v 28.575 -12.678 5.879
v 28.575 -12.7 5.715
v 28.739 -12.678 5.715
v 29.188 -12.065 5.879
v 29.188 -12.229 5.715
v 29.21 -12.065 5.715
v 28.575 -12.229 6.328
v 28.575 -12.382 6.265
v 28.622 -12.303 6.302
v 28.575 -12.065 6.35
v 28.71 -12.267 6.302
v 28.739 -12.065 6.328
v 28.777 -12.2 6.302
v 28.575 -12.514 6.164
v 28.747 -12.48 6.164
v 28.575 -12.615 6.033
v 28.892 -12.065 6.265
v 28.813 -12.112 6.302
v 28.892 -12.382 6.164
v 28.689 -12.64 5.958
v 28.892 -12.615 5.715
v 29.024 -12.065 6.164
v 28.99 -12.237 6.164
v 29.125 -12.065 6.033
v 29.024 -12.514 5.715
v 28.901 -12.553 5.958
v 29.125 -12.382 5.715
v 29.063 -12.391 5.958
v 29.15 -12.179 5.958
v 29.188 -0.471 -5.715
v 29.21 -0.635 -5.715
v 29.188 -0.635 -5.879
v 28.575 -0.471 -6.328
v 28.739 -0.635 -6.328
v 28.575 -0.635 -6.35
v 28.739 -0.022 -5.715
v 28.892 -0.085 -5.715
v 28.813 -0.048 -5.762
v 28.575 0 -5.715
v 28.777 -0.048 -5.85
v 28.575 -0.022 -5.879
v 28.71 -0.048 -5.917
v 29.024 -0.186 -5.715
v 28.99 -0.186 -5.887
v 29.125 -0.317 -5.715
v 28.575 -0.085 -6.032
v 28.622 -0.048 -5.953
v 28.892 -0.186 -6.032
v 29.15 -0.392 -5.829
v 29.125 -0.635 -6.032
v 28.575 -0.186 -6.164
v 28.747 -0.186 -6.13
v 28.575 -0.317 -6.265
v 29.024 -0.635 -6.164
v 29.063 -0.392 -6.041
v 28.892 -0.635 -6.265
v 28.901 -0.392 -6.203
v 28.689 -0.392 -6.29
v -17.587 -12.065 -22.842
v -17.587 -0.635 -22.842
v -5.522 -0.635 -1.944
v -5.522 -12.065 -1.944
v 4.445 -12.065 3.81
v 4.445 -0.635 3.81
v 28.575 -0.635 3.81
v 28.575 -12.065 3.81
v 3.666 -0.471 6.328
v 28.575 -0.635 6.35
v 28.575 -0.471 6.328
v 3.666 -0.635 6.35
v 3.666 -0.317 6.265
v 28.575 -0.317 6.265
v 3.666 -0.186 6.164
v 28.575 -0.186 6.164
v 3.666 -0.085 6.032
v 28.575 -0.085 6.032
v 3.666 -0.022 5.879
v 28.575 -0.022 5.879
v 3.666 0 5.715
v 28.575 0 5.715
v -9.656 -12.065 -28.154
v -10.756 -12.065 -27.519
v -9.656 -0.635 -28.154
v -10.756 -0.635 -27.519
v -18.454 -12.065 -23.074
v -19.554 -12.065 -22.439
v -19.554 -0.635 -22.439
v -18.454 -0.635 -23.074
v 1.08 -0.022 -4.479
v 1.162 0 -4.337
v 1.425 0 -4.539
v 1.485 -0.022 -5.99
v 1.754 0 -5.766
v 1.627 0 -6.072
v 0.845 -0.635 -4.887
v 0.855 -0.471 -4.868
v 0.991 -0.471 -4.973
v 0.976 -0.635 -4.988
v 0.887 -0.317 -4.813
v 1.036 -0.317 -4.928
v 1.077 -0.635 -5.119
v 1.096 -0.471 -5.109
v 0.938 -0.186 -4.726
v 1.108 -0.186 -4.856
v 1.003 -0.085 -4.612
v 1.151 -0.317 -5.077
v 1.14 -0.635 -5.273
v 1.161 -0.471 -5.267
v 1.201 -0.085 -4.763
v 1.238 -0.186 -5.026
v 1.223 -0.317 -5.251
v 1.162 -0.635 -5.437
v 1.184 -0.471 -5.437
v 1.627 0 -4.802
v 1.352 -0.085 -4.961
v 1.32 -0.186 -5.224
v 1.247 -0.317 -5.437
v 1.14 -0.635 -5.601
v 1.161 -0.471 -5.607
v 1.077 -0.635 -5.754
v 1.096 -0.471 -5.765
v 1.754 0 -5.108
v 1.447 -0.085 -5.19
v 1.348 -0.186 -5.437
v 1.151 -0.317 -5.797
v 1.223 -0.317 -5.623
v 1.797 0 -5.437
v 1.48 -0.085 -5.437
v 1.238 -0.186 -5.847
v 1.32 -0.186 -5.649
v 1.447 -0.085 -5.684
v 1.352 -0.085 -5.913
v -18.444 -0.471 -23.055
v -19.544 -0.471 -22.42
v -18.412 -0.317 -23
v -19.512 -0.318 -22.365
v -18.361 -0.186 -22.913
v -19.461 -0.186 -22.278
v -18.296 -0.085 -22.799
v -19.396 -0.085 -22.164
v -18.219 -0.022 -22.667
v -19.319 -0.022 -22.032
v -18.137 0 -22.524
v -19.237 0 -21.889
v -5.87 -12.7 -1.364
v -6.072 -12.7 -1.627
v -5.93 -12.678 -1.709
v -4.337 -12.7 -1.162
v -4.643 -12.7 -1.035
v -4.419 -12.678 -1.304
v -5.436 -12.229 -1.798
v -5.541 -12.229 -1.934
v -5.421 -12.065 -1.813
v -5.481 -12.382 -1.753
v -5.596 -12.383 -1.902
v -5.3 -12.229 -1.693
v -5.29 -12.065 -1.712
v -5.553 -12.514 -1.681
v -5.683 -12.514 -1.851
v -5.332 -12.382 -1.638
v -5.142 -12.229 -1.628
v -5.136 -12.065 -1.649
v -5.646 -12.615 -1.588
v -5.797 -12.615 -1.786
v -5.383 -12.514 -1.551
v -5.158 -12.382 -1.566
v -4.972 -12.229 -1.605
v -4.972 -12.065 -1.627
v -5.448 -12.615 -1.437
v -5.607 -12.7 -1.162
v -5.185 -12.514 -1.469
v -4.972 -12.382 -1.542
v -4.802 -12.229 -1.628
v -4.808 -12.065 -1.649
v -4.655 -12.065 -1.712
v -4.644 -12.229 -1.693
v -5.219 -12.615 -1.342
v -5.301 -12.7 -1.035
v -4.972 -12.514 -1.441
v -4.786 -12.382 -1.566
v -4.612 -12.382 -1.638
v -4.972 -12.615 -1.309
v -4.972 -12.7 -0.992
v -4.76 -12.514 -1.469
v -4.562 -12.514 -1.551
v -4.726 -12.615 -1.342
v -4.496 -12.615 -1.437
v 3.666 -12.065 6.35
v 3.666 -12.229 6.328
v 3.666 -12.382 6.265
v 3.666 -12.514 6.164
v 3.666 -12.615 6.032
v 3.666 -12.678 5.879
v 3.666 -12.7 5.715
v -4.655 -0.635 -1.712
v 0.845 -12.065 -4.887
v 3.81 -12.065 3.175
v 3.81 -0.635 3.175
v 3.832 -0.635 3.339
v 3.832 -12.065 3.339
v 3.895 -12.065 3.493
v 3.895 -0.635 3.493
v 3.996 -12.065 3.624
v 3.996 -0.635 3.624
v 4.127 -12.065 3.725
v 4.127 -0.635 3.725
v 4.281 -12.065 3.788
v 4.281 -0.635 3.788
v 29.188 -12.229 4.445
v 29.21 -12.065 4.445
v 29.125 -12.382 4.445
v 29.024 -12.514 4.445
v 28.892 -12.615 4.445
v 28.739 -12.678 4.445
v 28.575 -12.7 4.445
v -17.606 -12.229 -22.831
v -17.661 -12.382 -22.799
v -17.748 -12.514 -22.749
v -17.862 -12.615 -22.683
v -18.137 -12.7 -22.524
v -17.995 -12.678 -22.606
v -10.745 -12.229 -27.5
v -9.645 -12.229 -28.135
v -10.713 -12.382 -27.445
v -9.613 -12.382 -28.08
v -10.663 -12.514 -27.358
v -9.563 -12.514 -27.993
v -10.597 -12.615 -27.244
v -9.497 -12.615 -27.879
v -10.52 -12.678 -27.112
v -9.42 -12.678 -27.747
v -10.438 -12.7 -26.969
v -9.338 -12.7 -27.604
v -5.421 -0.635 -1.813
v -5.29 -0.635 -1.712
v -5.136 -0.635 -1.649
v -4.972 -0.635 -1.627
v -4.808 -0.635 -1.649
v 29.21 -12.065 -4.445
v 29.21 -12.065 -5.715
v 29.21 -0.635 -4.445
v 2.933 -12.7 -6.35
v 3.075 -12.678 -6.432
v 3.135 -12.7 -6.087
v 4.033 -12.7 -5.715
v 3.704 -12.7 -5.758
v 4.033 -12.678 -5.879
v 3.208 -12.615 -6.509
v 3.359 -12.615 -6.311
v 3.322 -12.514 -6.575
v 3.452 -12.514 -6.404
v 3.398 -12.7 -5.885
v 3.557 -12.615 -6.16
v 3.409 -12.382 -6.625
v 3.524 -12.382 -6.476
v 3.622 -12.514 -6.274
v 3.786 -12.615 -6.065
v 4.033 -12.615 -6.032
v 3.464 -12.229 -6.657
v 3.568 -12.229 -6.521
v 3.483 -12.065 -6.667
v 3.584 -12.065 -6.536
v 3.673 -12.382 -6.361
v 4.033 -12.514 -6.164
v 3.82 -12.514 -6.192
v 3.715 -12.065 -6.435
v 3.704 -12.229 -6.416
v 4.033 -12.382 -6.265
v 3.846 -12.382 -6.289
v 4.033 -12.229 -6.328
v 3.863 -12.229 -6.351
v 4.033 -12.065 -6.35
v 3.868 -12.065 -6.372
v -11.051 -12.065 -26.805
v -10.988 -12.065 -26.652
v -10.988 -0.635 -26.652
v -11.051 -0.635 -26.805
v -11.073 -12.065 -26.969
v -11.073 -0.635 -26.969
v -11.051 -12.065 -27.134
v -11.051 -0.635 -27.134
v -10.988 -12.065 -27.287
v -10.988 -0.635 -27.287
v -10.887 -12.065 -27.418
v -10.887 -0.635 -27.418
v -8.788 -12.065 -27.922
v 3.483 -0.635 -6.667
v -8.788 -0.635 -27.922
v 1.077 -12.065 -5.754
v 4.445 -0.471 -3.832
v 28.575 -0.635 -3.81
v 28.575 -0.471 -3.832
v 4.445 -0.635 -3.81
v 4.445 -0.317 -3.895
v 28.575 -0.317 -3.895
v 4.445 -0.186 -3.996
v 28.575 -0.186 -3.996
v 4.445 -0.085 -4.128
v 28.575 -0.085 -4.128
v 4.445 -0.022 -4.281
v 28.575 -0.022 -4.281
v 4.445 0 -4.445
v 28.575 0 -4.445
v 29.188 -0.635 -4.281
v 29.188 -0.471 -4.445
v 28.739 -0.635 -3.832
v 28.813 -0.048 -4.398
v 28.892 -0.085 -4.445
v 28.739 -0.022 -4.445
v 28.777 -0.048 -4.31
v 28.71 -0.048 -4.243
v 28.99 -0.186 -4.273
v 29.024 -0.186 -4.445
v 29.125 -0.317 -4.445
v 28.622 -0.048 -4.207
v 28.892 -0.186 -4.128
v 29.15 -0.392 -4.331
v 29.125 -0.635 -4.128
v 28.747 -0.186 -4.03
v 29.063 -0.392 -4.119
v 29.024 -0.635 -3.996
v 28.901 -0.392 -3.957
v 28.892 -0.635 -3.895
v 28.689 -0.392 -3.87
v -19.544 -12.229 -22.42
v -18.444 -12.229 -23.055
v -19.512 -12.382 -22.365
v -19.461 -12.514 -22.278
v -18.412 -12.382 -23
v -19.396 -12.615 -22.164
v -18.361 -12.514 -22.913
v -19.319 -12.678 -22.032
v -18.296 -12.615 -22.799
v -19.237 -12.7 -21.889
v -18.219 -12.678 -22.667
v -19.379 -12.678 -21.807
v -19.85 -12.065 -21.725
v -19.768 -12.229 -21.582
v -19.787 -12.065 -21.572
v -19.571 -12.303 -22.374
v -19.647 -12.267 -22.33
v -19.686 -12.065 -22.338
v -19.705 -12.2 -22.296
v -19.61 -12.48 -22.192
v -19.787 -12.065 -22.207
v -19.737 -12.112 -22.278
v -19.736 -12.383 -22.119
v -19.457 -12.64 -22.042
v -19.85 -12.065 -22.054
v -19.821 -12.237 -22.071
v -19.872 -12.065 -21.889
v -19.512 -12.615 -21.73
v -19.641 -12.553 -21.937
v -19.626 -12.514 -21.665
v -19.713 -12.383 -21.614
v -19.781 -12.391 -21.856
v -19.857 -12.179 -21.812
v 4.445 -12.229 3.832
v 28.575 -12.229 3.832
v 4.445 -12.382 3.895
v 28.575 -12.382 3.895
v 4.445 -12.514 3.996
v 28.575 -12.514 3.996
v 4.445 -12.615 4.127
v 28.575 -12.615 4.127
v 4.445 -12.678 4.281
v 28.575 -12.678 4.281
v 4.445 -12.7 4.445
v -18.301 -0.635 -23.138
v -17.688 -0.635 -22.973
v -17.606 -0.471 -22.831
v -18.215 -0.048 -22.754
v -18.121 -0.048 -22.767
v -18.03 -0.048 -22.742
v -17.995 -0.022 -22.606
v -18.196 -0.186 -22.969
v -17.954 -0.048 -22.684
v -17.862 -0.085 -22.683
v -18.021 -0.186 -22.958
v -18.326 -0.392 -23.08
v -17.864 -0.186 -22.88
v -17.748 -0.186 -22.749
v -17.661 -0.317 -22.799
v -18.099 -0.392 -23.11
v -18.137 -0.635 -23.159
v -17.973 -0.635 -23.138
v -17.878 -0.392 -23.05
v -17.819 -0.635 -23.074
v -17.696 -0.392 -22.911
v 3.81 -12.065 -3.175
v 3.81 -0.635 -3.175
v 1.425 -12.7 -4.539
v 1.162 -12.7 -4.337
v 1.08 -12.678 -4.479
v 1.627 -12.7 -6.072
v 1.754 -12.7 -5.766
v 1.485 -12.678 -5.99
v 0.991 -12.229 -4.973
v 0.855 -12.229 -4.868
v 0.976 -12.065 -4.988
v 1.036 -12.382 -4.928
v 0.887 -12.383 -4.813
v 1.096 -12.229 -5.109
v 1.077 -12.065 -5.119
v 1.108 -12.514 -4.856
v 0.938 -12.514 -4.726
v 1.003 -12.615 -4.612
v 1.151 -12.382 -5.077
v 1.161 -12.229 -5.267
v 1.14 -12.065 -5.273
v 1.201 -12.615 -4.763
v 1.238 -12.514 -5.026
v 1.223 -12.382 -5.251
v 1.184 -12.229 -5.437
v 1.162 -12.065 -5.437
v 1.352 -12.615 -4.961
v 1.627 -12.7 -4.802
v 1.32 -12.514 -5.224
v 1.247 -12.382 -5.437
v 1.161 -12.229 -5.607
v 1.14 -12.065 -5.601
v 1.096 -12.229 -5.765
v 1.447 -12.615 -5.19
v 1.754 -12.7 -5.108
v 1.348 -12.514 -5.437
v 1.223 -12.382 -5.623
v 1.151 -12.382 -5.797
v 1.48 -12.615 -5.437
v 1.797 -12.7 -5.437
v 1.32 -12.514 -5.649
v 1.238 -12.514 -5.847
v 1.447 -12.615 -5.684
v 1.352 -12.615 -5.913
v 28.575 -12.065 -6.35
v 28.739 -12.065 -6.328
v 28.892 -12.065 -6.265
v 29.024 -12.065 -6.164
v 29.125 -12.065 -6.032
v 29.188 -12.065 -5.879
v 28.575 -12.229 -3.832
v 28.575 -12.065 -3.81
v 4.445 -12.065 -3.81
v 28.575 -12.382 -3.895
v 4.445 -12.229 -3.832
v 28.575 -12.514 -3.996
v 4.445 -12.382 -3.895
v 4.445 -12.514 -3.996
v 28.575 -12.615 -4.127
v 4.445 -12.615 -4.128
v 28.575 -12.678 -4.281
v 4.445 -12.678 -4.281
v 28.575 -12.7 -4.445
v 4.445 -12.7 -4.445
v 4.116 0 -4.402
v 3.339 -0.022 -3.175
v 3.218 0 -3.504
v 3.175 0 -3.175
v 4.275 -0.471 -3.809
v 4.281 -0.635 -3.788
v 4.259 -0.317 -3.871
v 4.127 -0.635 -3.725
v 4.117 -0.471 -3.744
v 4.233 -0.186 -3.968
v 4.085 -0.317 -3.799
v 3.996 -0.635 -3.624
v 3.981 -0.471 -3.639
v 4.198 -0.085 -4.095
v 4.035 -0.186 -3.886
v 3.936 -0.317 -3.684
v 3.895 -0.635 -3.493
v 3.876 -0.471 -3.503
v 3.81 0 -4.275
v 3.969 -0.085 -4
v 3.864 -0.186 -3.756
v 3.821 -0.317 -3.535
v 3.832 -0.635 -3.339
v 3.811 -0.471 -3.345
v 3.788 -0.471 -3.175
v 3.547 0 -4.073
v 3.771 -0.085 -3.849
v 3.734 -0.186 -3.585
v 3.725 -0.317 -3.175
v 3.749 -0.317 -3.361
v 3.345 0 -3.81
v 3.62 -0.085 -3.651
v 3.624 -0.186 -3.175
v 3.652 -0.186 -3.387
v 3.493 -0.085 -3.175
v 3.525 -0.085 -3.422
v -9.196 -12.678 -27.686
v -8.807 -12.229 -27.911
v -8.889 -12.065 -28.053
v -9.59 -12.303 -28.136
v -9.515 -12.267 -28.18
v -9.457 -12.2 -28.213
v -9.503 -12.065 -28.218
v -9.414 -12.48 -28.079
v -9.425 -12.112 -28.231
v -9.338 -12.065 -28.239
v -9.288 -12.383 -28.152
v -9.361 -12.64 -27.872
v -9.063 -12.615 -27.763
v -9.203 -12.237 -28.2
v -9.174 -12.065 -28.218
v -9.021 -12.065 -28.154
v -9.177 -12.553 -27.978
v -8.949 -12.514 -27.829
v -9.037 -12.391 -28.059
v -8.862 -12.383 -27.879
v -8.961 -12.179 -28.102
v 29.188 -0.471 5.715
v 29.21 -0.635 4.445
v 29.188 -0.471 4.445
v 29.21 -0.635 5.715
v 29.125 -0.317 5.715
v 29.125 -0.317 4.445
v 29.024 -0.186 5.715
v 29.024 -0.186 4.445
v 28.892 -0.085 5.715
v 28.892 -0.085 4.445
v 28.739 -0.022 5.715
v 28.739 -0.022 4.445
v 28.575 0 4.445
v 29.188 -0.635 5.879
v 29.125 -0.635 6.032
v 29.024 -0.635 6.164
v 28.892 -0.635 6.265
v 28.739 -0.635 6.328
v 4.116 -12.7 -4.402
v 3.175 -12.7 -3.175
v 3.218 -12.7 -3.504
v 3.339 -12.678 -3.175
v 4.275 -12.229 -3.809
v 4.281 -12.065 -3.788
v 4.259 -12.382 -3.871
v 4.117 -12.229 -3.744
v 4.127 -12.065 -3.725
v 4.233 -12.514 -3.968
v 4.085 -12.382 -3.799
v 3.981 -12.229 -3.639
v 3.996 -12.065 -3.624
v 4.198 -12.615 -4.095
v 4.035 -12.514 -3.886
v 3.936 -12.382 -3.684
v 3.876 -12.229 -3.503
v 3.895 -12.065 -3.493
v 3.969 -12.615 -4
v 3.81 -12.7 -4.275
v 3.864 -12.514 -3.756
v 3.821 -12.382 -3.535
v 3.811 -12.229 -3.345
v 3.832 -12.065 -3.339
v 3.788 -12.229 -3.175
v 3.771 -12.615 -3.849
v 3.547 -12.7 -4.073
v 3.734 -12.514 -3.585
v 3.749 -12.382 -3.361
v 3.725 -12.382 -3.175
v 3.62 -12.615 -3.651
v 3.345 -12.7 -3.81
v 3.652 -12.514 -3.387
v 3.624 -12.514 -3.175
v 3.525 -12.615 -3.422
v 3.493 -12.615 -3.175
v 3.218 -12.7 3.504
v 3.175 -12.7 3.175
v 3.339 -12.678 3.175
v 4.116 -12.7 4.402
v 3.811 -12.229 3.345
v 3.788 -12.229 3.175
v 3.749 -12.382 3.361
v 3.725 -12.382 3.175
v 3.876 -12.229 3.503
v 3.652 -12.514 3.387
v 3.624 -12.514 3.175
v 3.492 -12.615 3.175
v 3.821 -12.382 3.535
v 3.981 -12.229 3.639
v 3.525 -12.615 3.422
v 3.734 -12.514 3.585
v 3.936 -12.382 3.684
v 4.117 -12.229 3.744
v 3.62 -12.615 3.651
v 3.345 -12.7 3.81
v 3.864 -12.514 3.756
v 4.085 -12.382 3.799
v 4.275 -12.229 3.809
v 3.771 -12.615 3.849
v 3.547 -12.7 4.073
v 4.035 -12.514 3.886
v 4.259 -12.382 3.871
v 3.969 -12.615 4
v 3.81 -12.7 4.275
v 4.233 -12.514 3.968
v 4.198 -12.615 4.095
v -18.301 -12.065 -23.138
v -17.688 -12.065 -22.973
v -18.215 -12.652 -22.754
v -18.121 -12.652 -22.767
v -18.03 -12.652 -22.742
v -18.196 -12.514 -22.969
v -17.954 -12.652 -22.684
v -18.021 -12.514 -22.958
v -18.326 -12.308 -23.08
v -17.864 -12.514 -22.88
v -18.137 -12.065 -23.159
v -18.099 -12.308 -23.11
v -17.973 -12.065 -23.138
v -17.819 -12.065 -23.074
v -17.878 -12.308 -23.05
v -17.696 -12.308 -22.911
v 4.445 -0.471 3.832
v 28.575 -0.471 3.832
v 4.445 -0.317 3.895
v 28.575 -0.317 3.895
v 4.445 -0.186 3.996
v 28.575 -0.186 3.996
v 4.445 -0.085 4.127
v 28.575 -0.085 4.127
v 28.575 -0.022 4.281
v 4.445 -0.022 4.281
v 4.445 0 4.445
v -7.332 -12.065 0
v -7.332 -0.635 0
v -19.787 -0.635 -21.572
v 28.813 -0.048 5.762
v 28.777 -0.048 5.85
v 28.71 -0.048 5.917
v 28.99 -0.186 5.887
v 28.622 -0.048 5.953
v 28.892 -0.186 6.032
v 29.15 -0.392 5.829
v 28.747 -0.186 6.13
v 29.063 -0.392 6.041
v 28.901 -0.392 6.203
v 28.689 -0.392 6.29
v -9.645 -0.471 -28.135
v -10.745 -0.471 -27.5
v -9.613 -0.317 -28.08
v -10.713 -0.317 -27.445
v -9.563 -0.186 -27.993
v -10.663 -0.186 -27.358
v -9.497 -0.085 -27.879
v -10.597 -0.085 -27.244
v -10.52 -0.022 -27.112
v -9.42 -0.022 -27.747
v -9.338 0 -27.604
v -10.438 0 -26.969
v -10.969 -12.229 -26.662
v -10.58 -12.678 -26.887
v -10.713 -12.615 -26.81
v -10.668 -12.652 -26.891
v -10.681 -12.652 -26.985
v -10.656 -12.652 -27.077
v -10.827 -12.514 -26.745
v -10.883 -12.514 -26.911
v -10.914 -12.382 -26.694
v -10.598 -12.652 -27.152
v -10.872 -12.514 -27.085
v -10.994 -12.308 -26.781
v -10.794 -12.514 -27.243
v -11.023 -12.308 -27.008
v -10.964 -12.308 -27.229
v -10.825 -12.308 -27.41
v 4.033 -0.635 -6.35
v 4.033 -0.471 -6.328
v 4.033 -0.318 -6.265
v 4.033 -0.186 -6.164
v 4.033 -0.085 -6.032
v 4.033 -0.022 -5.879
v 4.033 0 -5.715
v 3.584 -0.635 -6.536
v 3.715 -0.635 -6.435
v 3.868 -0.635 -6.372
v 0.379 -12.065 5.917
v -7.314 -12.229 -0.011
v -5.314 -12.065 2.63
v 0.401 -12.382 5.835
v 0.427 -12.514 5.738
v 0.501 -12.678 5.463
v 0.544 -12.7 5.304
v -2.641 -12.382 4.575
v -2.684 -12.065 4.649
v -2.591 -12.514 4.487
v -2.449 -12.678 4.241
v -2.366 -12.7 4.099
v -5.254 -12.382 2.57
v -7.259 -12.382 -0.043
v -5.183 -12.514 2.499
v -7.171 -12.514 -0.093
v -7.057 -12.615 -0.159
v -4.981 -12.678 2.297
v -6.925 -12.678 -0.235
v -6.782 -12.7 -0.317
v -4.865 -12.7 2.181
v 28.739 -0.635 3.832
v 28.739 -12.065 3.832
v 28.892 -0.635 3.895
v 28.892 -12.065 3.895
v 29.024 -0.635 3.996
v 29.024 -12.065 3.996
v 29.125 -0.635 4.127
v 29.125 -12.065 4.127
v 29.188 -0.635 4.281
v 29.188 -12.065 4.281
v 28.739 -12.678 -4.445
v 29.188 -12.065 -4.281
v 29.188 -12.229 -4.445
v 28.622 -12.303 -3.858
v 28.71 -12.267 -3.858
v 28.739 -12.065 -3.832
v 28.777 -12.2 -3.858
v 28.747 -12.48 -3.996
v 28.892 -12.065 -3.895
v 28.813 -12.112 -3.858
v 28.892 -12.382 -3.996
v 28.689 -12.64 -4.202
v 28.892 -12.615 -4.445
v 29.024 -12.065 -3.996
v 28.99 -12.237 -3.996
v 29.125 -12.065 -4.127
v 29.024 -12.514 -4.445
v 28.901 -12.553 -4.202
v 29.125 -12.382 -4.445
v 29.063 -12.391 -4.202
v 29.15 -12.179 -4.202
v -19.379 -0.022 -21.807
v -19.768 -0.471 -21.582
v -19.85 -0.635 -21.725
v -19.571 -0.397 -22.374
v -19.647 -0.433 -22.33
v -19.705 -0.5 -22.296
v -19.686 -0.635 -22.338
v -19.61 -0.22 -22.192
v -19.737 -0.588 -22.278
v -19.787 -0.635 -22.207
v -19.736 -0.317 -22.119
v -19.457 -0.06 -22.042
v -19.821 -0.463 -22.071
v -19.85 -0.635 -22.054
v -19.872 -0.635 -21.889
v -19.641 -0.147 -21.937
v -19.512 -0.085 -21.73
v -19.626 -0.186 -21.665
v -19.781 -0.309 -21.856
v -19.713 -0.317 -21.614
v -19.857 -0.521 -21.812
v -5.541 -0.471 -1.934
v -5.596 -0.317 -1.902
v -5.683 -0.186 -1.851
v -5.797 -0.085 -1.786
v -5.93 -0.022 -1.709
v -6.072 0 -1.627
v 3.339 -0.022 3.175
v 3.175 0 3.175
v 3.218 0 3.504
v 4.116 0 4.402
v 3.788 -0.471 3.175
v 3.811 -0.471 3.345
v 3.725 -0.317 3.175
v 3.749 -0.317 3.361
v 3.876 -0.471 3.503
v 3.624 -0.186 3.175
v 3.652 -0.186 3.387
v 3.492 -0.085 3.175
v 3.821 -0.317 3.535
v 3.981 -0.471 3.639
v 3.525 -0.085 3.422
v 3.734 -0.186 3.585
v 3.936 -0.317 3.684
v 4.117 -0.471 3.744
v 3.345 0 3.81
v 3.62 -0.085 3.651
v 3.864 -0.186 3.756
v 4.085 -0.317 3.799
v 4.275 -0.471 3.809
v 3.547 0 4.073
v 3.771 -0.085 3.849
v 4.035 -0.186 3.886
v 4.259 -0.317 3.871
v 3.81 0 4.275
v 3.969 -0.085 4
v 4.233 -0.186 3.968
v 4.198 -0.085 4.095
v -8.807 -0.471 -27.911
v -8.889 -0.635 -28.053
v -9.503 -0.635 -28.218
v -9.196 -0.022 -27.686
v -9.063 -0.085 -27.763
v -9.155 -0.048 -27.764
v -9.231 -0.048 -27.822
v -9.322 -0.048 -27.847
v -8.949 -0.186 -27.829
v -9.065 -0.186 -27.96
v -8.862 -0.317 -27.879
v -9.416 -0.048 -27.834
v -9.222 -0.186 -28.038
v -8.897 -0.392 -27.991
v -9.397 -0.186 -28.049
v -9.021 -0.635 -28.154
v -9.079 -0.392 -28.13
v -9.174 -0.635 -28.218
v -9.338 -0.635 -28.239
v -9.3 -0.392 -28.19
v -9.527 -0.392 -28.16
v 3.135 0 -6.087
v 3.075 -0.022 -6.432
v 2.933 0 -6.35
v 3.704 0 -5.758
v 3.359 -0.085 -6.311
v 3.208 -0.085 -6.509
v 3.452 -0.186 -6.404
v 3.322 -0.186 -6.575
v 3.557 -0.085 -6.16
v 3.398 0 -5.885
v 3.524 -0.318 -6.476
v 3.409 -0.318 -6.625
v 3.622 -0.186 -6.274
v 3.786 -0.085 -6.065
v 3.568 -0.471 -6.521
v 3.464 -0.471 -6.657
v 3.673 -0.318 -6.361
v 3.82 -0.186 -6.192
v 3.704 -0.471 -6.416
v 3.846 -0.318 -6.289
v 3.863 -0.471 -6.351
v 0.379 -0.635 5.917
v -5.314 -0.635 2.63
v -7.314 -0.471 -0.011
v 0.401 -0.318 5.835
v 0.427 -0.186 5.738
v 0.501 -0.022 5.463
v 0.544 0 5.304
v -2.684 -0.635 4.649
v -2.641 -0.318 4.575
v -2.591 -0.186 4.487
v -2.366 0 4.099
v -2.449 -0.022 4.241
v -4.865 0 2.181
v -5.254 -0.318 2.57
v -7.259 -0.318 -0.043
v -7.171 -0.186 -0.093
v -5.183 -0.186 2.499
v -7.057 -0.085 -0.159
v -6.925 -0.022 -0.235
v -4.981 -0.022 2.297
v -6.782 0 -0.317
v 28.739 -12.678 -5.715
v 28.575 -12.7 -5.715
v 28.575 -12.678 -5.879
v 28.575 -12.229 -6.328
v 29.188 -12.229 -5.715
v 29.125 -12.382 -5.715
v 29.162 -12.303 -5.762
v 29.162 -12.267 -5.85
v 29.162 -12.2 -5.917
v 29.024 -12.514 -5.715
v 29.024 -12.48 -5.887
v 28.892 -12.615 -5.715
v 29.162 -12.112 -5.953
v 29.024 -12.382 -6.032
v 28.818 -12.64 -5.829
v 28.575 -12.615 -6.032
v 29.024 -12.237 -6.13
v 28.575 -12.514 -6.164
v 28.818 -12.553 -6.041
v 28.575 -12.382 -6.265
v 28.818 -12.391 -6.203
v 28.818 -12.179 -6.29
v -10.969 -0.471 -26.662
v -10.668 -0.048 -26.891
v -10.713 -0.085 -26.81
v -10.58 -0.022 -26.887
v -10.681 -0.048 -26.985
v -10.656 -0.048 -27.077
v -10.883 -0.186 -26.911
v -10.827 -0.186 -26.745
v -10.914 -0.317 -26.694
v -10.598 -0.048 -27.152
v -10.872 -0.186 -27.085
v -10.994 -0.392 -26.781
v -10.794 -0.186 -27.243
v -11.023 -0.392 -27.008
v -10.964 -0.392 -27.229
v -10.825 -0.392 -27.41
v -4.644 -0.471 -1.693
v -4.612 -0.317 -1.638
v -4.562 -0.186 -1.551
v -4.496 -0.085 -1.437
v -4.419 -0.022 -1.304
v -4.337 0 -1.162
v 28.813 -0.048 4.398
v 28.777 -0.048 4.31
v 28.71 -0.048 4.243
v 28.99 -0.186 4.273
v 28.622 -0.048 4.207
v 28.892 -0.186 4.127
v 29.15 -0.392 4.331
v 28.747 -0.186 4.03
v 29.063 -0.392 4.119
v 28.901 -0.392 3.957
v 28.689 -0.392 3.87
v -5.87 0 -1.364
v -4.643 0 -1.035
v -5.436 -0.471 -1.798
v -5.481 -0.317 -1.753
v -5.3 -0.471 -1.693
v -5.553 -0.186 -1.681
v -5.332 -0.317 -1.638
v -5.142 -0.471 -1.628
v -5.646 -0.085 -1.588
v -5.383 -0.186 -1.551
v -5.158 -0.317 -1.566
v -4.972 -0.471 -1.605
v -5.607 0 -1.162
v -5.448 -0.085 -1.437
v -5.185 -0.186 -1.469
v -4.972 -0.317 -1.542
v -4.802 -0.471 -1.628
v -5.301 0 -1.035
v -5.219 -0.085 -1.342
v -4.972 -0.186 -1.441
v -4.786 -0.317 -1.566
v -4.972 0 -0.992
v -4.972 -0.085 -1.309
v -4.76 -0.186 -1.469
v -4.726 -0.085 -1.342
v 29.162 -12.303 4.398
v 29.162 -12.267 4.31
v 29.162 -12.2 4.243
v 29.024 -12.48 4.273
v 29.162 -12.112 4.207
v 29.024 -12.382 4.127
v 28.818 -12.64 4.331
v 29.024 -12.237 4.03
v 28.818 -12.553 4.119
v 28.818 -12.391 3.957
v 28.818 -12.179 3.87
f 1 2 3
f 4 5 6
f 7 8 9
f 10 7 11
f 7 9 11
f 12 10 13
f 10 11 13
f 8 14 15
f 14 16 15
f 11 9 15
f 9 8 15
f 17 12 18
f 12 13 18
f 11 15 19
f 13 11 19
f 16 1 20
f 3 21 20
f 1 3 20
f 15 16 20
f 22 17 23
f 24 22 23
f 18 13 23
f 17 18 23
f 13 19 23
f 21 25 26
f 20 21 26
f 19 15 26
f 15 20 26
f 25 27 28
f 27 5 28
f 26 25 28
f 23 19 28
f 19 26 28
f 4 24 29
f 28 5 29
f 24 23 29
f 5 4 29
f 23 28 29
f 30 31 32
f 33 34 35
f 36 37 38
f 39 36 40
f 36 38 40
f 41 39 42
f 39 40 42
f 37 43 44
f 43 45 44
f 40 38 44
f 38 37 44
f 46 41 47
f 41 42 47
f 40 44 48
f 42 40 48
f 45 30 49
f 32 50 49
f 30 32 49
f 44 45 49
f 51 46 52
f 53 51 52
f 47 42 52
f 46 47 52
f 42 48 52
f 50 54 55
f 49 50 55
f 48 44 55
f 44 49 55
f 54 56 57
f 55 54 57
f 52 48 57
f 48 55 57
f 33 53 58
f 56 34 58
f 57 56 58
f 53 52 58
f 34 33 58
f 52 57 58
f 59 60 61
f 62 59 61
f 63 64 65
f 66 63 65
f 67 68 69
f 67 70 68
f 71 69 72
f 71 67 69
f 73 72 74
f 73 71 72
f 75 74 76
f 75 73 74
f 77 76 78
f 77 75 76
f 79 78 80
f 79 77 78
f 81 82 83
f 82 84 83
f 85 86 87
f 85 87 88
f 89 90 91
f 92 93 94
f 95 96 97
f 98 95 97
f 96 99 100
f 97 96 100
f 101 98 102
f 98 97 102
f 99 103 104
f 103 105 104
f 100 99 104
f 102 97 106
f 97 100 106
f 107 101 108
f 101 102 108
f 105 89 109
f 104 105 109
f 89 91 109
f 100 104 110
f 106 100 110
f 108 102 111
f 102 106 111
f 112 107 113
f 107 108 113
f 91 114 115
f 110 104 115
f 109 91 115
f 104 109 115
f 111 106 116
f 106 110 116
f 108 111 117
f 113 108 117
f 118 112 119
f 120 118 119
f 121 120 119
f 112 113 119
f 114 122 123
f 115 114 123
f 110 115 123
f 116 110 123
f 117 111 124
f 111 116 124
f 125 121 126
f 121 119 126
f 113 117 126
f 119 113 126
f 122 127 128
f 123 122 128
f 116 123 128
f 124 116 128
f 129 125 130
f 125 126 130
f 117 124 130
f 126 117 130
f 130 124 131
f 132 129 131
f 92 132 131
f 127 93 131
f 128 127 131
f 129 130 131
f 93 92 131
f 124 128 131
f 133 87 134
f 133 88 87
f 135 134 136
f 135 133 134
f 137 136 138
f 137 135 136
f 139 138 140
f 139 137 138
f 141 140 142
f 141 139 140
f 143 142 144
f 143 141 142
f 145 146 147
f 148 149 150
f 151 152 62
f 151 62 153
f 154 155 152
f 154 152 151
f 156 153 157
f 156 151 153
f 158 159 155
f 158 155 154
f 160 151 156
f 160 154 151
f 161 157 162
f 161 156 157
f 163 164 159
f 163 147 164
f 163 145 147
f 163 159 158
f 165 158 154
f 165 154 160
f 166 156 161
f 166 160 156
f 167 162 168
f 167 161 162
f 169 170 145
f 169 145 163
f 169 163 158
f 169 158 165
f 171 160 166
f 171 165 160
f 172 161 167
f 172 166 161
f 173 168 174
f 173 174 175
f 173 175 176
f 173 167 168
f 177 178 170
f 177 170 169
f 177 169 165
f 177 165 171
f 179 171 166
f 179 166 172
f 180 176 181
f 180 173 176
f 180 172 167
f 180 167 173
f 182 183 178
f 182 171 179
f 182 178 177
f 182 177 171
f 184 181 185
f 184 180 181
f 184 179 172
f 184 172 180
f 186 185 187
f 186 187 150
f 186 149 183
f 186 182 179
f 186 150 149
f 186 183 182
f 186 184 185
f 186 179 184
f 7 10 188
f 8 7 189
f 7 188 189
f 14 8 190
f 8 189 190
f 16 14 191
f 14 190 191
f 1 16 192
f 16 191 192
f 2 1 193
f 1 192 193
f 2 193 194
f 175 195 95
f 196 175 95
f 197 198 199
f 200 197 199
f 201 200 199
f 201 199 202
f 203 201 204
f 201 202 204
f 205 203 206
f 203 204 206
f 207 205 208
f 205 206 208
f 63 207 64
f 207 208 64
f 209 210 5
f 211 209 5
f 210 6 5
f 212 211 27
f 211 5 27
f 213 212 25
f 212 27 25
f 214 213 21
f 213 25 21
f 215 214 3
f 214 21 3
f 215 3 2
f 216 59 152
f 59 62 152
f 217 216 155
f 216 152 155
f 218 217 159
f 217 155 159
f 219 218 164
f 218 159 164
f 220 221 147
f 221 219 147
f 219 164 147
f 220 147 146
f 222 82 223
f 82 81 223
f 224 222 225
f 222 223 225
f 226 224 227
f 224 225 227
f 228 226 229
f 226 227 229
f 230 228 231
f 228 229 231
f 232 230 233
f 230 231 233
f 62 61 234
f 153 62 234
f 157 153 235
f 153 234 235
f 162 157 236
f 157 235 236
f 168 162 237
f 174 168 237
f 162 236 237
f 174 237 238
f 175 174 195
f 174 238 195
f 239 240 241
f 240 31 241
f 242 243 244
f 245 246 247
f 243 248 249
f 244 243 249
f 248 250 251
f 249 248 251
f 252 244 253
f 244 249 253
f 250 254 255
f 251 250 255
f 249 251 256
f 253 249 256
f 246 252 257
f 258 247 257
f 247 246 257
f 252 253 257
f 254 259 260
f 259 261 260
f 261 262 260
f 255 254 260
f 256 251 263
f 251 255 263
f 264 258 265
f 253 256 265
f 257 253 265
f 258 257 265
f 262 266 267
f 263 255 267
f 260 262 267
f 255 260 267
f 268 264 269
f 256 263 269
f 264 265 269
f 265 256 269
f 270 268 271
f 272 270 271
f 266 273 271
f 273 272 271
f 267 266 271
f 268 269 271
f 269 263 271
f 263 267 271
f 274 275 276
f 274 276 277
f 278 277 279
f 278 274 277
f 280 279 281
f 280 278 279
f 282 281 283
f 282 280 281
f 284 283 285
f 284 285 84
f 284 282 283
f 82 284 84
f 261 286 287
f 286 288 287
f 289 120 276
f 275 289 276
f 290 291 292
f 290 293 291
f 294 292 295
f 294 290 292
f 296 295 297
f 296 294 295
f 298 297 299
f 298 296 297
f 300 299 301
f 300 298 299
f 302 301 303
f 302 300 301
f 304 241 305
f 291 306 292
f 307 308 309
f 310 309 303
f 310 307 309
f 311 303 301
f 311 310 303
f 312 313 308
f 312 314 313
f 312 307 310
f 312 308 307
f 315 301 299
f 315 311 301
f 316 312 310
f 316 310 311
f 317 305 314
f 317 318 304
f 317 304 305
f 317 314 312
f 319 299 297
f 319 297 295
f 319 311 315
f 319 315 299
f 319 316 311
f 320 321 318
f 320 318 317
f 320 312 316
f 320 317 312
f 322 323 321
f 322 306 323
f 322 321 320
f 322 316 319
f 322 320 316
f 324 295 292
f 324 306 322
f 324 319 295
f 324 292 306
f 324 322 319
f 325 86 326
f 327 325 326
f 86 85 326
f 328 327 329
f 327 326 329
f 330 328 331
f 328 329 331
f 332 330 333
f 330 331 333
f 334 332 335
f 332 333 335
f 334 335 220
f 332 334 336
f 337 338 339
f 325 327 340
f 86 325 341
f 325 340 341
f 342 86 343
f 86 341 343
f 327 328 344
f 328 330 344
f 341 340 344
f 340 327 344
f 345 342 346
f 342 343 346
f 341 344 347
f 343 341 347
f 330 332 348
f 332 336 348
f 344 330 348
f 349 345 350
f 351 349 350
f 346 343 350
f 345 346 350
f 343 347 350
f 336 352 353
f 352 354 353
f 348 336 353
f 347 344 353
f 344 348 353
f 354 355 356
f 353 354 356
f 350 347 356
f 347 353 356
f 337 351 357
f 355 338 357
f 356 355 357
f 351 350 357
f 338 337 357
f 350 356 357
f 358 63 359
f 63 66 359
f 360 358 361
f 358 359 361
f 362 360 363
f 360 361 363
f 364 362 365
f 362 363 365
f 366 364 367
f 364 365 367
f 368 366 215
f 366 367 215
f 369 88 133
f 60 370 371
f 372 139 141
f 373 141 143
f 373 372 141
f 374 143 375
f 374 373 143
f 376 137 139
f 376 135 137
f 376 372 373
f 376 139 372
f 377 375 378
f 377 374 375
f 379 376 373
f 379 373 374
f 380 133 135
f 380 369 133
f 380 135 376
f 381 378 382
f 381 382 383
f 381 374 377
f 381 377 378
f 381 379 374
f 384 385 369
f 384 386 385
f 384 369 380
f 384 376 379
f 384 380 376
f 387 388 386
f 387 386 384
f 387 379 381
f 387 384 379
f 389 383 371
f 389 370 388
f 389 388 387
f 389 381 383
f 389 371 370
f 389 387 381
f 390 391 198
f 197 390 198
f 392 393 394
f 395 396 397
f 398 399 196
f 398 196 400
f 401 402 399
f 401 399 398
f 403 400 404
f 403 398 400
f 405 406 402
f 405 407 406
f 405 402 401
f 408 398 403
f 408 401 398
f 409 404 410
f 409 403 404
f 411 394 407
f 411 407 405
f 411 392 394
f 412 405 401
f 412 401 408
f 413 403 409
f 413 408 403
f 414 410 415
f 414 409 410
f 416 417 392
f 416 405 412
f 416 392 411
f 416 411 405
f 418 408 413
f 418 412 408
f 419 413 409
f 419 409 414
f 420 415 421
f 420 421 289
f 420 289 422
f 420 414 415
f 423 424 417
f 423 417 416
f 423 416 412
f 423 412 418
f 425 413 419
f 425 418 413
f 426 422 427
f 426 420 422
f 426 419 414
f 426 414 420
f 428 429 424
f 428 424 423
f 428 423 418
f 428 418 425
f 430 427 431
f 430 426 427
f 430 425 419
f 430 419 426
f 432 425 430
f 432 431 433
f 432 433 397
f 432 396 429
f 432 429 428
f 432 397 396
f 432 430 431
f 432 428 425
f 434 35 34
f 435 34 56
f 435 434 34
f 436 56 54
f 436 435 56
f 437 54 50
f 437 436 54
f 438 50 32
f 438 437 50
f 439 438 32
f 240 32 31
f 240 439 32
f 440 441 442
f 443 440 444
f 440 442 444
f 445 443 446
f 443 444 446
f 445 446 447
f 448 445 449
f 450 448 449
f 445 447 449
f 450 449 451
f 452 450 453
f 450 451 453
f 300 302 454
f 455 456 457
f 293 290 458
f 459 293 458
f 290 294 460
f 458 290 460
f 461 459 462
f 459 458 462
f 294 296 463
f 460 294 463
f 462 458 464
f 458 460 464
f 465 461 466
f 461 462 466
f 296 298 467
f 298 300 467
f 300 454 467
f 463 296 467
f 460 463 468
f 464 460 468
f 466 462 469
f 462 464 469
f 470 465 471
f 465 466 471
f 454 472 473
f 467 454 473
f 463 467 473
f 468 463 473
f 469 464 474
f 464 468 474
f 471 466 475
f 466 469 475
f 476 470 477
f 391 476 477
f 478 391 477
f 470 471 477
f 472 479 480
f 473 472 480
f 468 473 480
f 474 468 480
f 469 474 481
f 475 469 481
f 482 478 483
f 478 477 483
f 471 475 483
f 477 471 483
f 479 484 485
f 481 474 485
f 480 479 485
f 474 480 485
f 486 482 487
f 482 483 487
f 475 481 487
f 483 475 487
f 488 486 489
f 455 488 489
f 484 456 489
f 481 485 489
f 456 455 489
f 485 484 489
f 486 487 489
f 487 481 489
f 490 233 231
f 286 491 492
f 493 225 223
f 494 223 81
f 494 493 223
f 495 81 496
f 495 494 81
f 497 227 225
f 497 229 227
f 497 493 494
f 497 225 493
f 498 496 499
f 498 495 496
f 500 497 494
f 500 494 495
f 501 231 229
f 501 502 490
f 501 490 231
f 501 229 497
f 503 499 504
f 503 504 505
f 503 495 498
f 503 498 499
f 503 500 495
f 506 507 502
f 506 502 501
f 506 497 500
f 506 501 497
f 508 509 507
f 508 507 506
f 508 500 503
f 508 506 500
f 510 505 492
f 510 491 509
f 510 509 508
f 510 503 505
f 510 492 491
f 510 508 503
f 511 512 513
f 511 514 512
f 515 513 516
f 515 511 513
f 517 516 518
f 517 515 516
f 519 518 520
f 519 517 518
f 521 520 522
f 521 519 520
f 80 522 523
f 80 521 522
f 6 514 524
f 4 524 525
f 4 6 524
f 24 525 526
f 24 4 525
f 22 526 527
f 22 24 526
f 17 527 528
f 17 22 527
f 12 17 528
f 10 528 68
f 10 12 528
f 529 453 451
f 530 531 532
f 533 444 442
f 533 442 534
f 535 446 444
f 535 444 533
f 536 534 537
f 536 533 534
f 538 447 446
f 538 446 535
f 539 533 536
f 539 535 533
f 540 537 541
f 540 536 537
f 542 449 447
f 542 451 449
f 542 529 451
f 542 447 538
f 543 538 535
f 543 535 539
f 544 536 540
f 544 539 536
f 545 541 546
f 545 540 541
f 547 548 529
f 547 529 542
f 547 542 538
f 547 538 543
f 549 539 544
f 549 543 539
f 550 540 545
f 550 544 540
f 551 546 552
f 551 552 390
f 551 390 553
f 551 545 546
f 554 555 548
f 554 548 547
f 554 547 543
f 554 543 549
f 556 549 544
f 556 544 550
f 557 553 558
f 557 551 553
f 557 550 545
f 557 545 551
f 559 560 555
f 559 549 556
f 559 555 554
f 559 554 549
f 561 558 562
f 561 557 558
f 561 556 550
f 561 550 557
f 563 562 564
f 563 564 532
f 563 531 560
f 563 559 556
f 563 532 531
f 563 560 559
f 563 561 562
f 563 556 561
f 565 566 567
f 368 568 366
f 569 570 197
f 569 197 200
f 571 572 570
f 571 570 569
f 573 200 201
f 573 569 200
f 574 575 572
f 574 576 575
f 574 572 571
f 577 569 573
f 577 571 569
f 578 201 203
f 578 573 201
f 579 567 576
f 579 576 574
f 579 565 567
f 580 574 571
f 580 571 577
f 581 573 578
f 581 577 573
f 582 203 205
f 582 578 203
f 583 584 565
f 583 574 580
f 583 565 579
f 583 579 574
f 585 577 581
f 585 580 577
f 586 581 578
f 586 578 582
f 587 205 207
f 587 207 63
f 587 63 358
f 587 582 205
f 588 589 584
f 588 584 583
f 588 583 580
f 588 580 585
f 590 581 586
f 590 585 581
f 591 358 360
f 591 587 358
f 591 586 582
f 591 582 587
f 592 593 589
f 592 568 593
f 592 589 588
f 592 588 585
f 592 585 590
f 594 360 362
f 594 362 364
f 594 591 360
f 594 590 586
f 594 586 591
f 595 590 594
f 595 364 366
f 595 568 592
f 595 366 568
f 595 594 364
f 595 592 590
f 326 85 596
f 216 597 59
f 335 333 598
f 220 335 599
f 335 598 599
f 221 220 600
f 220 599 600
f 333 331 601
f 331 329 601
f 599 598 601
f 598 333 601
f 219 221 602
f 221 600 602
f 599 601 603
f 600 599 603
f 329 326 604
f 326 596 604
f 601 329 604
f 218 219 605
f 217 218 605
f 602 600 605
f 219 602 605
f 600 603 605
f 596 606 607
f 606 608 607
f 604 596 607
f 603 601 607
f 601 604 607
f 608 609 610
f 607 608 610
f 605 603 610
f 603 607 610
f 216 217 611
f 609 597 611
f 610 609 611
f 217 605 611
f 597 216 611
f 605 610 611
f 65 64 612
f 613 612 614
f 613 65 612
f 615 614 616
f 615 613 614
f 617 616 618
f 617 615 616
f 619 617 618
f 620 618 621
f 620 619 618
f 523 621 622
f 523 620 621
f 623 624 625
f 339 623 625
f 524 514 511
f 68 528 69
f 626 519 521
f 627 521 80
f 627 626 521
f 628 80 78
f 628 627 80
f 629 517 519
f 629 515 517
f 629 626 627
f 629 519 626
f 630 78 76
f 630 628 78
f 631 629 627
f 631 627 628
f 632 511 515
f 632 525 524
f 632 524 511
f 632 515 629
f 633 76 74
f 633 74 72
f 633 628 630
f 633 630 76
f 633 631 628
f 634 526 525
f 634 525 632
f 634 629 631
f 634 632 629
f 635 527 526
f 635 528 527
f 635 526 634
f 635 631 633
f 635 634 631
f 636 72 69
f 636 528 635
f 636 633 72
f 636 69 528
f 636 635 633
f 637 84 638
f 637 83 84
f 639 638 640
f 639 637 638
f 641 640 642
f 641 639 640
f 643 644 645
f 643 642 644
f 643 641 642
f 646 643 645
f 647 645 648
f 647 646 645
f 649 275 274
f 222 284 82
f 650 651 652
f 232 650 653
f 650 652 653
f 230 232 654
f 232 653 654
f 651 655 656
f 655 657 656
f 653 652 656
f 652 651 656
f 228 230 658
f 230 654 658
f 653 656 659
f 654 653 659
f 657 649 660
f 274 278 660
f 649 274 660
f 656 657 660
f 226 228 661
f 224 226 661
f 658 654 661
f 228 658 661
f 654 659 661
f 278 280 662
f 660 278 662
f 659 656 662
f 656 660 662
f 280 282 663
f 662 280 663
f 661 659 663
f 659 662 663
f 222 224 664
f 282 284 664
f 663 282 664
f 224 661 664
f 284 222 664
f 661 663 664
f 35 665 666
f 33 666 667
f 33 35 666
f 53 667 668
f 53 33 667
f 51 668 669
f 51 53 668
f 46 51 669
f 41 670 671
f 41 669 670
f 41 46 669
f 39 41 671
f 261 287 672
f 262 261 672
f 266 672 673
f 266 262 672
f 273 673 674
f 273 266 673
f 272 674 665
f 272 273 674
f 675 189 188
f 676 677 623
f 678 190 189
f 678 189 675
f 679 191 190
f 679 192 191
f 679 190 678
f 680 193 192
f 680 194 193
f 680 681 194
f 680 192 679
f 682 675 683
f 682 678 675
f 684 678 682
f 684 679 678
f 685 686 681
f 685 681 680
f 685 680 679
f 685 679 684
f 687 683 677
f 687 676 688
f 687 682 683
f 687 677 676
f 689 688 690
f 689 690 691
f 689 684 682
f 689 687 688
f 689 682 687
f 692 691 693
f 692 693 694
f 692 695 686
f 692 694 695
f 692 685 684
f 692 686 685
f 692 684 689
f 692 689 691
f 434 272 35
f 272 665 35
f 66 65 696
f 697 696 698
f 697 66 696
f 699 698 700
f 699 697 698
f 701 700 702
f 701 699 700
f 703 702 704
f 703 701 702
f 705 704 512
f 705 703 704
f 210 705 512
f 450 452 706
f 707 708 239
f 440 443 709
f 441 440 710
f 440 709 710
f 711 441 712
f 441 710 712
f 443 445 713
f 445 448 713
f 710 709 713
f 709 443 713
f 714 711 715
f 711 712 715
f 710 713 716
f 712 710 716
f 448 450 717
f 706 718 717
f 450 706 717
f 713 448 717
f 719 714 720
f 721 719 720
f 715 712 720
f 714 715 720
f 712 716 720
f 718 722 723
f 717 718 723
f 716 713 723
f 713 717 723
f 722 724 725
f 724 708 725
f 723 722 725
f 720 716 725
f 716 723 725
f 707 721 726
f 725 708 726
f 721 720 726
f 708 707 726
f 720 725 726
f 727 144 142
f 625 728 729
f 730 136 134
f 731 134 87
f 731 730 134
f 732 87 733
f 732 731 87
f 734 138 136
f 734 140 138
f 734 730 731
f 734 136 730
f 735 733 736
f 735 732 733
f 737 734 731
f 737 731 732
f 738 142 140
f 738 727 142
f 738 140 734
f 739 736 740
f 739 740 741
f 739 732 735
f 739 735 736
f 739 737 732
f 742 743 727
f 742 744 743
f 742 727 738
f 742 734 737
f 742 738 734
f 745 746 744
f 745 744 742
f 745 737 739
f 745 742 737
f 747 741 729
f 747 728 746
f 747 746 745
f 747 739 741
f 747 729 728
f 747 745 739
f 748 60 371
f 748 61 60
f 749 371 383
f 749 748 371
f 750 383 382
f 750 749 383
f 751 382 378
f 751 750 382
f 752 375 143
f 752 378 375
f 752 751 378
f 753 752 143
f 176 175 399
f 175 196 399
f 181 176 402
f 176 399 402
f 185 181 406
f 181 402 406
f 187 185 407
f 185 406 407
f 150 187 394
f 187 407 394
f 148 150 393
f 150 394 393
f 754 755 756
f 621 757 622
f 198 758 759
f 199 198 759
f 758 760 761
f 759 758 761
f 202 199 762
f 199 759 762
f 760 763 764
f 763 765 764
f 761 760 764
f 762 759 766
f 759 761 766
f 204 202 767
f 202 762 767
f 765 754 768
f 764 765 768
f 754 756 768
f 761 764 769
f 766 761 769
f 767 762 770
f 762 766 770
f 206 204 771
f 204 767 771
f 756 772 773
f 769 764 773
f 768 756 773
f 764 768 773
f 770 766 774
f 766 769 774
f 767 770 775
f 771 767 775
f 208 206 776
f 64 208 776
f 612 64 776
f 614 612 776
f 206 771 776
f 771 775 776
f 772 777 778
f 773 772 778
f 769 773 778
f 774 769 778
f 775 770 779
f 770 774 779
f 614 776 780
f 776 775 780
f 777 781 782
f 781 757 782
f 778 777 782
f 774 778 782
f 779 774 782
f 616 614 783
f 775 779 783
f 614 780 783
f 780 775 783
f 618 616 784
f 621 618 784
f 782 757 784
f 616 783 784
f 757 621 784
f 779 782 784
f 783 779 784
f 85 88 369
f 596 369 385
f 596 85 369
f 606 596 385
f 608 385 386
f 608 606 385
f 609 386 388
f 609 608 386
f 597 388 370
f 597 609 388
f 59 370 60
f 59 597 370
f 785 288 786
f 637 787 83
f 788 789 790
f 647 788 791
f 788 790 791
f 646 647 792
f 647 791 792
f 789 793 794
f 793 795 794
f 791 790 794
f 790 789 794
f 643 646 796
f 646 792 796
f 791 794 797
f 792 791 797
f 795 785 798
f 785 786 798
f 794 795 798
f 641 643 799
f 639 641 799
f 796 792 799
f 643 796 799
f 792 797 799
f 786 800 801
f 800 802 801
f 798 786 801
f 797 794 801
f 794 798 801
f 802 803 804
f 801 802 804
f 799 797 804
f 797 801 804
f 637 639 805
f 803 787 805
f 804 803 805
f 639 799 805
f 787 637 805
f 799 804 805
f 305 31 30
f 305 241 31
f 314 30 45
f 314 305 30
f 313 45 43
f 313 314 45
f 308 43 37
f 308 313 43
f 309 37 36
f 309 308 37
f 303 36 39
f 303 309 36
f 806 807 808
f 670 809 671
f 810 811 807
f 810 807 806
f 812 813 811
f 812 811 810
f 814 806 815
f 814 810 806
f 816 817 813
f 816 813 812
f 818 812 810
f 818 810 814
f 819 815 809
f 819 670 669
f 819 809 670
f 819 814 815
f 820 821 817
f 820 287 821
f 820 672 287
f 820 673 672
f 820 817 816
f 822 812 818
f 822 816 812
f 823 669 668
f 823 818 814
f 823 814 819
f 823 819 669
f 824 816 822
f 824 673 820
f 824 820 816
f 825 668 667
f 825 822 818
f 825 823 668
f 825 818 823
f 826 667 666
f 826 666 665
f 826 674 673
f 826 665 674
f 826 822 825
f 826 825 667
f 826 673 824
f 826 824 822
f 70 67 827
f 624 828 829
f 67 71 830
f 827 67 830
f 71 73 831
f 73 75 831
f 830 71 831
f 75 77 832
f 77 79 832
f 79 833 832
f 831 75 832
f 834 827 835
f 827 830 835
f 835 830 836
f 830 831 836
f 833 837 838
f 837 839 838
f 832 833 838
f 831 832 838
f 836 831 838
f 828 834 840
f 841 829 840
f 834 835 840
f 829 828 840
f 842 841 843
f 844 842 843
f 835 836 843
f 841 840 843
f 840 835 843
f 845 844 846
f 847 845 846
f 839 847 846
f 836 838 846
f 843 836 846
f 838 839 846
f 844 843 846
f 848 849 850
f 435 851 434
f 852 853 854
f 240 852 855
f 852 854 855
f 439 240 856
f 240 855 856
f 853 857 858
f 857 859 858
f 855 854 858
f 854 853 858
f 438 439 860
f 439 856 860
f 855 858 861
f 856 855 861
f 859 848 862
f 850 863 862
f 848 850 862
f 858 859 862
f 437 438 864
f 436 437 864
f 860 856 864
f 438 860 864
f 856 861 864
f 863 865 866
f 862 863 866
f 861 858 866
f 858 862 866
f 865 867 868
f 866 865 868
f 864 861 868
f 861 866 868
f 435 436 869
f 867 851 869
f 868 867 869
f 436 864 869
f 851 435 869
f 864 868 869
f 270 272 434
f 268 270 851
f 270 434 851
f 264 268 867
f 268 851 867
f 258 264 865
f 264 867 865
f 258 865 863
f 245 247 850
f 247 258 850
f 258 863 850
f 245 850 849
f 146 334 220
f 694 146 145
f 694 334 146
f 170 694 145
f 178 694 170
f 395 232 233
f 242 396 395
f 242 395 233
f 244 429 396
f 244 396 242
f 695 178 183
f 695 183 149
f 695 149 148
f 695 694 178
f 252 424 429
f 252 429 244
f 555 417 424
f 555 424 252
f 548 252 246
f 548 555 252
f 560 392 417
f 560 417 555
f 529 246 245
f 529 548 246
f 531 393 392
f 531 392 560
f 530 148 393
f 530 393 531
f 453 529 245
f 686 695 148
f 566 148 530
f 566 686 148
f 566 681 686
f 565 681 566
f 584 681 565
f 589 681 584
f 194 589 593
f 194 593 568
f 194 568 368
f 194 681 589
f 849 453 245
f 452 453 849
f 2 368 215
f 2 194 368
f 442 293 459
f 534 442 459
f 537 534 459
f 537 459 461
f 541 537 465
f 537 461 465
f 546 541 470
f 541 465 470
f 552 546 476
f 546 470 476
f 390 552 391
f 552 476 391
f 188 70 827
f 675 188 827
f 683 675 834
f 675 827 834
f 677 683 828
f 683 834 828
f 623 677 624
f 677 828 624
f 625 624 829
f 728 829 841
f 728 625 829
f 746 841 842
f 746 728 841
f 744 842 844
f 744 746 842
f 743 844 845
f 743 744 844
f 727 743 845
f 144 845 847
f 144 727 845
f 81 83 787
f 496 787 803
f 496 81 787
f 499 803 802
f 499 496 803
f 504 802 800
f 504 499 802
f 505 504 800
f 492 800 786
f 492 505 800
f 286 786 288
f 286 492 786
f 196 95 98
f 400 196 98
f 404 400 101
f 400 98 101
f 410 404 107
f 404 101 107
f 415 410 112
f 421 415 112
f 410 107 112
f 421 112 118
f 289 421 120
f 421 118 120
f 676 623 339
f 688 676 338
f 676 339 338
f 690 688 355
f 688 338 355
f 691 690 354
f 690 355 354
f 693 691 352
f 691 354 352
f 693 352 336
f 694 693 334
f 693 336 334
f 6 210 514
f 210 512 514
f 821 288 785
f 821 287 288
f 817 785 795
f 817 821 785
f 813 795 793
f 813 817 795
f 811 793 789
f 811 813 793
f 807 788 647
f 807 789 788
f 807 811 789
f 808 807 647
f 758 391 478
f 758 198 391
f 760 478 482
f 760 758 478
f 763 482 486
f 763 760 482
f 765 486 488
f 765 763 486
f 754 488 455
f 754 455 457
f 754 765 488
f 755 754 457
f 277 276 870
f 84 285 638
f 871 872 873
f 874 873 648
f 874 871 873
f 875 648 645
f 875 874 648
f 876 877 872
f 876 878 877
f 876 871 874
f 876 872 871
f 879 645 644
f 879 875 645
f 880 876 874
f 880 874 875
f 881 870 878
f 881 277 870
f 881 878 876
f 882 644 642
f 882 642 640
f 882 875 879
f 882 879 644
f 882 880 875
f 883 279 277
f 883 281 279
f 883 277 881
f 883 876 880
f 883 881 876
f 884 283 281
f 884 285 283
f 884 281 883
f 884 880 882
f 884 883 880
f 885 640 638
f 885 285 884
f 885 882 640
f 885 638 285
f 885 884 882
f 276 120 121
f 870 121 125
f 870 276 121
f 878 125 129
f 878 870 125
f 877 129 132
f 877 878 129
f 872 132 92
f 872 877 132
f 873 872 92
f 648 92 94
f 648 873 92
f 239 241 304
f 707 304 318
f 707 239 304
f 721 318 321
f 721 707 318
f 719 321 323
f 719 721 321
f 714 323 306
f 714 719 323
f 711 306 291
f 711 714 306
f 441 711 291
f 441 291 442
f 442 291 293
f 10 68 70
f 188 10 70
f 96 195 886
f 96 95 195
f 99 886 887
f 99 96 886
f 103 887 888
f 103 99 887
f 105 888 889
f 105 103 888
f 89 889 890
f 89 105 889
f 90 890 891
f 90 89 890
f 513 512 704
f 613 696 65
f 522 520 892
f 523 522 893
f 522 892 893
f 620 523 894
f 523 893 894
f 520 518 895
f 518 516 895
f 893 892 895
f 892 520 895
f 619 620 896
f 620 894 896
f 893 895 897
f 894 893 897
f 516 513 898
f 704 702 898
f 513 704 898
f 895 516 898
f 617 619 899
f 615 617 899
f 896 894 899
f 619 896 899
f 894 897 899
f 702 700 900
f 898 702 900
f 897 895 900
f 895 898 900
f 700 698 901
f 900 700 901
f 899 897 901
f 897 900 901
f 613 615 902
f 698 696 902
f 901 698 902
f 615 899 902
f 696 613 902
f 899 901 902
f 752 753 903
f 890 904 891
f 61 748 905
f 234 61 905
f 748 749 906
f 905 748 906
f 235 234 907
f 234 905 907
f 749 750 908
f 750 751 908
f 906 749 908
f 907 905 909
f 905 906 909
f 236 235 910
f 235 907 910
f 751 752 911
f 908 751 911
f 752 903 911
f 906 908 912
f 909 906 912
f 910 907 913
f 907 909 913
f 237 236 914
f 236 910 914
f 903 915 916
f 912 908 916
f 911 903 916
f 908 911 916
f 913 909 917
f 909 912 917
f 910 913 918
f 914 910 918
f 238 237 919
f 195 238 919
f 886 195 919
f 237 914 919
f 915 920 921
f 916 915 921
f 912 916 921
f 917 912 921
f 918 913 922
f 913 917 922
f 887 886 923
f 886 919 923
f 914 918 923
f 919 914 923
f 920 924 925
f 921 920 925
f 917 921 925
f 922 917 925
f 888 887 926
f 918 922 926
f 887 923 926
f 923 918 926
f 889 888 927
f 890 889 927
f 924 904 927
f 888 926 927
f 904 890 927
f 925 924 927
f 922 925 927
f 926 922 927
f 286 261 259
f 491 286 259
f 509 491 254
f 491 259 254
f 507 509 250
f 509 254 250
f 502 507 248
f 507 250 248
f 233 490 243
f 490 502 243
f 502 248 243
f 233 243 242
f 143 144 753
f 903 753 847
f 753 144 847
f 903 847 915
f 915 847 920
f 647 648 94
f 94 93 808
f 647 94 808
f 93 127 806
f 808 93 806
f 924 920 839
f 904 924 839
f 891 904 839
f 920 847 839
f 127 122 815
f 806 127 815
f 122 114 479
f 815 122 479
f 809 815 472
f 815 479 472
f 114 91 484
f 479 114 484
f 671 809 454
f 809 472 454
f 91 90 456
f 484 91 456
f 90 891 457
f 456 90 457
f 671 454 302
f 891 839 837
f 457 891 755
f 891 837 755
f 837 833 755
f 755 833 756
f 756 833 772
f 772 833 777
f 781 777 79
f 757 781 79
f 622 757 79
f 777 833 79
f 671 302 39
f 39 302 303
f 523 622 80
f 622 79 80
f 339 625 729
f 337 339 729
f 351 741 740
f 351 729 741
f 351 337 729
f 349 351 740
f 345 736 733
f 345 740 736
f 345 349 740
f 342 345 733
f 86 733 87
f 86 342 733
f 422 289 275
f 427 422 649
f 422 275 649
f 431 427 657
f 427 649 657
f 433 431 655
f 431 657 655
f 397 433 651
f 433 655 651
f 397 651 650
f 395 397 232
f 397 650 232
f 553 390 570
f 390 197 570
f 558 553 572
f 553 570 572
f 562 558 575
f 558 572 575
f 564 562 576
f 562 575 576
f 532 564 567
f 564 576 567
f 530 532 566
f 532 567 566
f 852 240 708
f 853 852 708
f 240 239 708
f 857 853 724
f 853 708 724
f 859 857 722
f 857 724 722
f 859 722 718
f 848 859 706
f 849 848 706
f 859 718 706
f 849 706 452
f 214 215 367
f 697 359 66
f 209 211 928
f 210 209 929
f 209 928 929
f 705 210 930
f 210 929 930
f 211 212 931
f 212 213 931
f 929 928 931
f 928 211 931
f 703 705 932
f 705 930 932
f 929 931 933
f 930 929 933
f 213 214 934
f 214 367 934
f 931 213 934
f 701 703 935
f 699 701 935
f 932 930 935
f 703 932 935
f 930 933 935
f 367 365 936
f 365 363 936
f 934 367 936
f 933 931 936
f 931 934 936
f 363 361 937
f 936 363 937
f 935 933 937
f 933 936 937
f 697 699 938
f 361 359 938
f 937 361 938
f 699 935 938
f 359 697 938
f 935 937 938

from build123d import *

# Parameters (mm, degrees)
F1_DEPTH = 12.7
F2_R     = 0.635


with BuildPart() as f1:
    # F0 (on Front) → F1 (new body)
    with BuildSketch(Plane.XZ):
        with BuildLine():
            Line((4.445, 3.81), (29.21, 3.81))
            Line((29.21, 3.81), (29.21, 6.35))
            Line((29.21, 6.35), (3.666174, 6.35))
            ThreePointArc((3.666174, 6.35), (-2.683826, 4.648523), (-7.332348, 0))
            Line((-7.332348, 0), (-20.104261, -22.121602))
            Line((-20.104261, -22.121602), (-17.904557, -23.391602))
            Line((-17.904557, -23.391602), (-5.522057, -1.944483))
            ThreePointArc((-5.522057, -1.944483), (-5.136481, -1.64862), (-4.654631, -1.712057))
            Line((-4.654631, -1.712057), (0.844631, -4.887057))
            ThreePointArc((0.844631, -4.887057), (1.140494, -5.272633), (1.077057, -5.754483))
            Line((1.077057, -5.754483), (-11.305443, -27.201602))
            Line((-11.305443, -27.201602), (-9.105739, -28.471602))
            Line((-9.105739, -28.471602), (3.666174, -6.35))
            Line((3.666174, -6.35), (29.21, -6.35))
            Line((29.21, -6.35), (29.21, -3.81))
            Line((29.21, -3.81), (4.445, -3.81))
            ThreePointArc((4.445, -3.81), (3.995987, -3.624013), (3.81, -3.175))
            Line((3.81, -3.175), (3.81, 3.175))
            ThreePointArc((3.81, 3.175), (3.995987, 3.624013), (4.445, 3.81))
        make_face()
    extrude(amount=F1_DEPTH)

    # F2
    f2_edges = [f1.edges().sort_by_distance(p)[0] for p in [
        (-2.719782, -12.7, -17.410801),
        (16.438087, -12.7, -6.35),
        (29.21, -12.7, -5.08),
        (16.8275, -12.7, -3.81),
        (3.995987, -12.7, -3.624013),
        (3.81, -12.7, 0),
        (3.995987, -12.7, 3.624013),
        (16.8275, -12.7, 3.81),
        (29.21, -12.7, 5.08),
        (16.438087, -12.7, 6.35),
        (-2.683826, -12.7, 4.648523),
        (-13.718305, -12.7, -11.060801),
        (-19.004409, -12.7, -22.756602),
        (-11.713307, -12.7, -12.668042),
        (-5.136481, -12.7, -1.64862),
        (-1.905, -12.7, -3.299557),
        (1.140494, -12.7, -5.272633),
        (-5.114193, -12.7, -16.478042),
        (-10.205591, -12.7, -27.836602),
        (29.21, -6.35, 3.81),
        (29.21, -6.35, 6.35),
        (29.21, 0, 5.08),
        (29.21, -6.35, -6.35),
        (29.21, -6.35, -3.81),
        (29.21, 0, -5.08),
        (-9.105739, -6.35, -28.471602),
        (3.666174, -6.35, -6.35),
        (-2.719782, 0, -17.410801),
        (16.438087, 0, -6.35),
        (16.8275, 0, -3.81),
        (3.995987, 0, -3.624013),
        (3.81, 0, 0),
        (3.995987, 0, 3.624013),
        (16.8275, 0, 3.81),
        (16.438087, 0, 6.35),
        (-2.683826, 0, 4.648523),
        (-13.718305, 0, -11.060801),
        (-19.004409, 0, -22.756602),
        (-11.713307, 0, -12.668042),
        (-5.136481, 0, -1.64862),
        (-1.905, 0, -3.299557),
        (1.140494, 0, -5.272633),
        (-5.114193, 0, -16.478042),
        (-10.205591, 0, -27.836602),
        (-11.305443, -6.35, -27.201602),
        (-20.104261, -6.35, -22.121602),
        (-17.904557, -6.35, -23.391602),
    ]]
    fillet(f2_edges, radius=F2_R)


solid = f1.part
